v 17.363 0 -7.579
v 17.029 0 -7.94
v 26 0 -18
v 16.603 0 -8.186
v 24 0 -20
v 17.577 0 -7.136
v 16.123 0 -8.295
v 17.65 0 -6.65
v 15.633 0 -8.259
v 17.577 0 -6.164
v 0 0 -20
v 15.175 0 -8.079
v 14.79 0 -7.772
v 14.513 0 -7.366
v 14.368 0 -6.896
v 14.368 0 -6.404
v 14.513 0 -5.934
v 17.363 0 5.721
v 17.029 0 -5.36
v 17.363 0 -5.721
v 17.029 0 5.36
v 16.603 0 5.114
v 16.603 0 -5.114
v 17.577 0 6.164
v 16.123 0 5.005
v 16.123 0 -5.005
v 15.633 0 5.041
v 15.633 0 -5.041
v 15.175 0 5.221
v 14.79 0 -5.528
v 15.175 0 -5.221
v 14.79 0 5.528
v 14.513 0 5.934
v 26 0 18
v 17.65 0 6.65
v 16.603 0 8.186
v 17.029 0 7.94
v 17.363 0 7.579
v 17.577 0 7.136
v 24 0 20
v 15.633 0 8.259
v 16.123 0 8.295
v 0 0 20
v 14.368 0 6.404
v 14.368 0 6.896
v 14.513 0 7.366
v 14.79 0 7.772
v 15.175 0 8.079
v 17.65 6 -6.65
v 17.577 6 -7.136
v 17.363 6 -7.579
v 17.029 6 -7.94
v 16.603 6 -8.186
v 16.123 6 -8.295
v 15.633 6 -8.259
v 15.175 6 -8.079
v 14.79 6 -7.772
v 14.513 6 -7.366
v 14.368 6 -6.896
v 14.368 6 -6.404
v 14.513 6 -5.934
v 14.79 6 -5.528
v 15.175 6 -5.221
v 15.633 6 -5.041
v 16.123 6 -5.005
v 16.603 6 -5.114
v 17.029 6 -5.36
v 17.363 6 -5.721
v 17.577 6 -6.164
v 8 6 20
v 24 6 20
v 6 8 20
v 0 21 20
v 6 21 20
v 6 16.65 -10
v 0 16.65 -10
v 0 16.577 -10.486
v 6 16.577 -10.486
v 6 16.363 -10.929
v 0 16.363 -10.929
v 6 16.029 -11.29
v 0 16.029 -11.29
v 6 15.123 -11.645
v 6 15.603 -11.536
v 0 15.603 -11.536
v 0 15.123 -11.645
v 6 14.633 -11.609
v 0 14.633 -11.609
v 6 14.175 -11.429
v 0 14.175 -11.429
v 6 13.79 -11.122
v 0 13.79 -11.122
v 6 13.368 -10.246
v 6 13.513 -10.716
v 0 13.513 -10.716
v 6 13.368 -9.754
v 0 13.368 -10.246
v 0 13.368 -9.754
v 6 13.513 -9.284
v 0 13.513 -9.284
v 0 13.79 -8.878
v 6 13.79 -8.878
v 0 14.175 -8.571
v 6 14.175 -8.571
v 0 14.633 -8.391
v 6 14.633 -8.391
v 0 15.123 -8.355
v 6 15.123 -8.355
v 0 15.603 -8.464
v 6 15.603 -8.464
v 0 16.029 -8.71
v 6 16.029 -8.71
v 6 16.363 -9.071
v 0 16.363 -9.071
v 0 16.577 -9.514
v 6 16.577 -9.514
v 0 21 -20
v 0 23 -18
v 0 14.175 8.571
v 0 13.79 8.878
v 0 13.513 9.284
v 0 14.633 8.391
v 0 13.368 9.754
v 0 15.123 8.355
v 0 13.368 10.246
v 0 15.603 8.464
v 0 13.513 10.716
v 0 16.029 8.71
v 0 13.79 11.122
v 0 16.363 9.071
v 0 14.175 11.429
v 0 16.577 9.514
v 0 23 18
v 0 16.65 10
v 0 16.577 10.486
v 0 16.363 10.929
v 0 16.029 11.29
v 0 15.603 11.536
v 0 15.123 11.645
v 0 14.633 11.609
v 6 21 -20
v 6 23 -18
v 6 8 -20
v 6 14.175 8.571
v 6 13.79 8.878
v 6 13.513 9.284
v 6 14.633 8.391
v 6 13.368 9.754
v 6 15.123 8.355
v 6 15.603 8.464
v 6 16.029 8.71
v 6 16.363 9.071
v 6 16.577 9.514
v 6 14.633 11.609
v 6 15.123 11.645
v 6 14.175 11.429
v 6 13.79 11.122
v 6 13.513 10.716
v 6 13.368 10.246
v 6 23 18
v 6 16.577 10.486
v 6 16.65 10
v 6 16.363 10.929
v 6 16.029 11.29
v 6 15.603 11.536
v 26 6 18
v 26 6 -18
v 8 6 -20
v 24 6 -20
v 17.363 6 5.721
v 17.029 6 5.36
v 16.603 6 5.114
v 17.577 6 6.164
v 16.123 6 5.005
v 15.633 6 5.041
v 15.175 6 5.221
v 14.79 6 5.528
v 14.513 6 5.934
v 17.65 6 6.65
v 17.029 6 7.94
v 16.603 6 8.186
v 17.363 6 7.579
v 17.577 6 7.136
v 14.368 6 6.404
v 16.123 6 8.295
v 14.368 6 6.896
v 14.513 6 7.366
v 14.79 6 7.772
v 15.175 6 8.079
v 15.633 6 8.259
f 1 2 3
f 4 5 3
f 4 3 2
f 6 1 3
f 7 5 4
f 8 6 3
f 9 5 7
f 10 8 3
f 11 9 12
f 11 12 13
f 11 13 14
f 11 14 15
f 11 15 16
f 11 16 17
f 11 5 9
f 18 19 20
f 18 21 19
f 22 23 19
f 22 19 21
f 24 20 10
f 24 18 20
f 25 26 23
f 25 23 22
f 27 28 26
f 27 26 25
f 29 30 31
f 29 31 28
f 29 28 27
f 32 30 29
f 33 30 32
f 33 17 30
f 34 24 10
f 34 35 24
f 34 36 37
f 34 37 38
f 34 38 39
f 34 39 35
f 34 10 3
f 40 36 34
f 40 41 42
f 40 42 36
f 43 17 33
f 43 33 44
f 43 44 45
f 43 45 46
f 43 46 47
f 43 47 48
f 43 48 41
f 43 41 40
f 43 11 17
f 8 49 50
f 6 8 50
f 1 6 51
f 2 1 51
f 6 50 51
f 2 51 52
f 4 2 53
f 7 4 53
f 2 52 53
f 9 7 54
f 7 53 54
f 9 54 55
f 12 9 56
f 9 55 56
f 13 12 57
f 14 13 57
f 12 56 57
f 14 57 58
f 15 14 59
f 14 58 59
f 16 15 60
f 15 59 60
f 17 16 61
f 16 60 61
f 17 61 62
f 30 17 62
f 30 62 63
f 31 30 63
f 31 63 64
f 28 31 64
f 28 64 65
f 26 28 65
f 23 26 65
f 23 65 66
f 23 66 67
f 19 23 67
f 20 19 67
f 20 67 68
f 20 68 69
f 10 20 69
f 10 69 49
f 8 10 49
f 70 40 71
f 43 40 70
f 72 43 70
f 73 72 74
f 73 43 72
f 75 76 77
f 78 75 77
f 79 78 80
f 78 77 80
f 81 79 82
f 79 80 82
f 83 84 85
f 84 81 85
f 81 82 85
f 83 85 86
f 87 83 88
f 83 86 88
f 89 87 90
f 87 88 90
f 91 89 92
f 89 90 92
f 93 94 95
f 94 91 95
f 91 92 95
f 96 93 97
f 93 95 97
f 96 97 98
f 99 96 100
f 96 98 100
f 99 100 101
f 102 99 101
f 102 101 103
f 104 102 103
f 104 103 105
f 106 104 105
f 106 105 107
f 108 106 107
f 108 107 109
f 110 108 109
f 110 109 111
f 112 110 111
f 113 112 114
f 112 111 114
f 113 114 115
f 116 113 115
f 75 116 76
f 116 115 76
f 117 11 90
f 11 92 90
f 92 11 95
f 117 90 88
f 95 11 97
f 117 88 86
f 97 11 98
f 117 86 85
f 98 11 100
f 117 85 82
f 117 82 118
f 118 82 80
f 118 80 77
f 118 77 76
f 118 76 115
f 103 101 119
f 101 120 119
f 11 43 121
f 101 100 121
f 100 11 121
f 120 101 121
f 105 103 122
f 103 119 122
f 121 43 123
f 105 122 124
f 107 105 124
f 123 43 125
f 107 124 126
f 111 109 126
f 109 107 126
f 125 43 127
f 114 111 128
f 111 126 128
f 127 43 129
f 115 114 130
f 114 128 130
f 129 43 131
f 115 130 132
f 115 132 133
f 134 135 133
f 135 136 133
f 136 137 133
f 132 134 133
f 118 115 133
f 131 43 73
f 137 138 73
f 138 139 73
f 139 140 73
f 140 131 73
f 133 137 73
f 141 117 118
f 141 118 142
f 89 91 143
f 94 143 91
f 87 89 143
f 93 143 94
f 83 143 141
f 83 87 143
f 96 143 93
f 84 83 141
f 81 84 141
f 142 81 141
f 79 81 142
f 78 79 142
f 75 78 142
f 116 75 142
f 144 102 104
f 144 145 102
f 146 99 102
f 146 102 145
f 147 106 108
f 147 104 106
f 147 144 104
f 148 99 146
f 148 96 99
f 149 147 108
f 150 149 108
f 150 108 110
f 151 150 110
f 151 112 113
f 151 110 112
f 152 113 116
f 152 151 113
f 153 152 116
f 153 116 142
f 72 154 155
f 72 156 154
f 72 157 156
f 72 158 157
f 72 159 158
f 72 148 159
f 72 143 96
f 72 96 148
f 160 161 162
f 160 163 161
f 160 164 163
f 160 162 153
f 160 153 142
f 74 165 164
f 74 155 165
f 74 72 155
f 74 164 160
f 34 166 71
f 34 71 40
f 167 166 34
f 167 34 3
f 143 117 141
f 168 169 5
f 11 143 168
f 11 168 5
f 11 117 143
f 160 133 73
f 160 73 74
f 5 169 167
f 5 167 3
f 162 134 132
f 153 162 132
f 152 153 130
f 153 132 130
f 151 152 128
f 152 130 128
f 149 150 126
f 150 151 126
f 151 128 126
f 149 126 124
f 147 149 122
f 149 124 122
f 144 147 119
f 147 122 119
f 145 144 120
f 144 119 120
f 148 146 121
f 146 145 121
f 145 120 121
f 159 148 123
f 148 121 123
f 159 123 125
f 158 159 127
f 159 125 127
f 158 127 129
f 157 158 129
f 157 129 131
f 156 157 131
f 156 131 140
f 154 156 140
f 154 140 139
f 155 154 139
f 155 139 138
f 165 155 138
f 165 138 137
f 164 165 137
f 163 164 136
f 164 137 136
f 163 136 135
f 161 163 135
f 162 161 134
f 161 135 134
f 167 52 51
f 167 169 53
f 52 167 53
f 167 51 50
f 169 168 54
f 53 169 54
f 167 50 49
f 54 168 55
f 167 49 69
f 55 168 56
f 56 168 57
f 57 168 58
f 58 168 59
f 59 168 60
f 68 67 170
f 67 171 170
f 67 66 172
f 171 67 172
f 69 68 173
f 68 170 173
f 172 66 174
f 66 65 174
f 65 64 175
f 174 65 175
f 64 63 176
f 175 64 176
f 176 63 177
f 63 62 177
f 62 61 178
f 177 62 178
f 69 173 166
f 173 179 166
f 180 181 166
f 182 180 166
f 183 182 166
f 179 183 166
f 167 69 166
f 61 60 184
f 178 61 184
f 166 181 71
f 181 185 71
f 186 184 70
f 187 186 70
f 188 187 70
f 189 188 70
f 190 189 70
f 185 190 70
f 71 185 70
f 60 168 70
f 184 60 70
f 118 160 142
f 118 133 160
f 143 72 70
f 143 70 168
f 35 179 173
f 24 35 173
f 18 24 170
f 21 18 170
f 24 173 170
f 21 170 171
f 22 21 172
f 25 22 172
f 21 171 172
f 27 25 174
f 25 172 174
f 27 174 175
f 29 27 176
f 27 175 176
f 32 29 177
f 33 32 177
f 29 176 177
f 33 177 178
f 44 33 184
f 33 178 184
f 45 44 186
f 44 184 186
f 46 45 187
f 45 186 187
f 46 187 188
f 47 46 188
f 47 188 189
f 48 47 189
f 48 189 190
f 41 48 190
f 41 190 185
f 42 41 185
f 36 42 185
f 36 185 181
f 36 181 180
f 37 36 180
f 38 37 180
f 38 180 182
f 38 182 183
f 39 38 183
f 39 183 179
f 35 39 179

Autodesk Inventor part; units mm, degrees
ref_plane "YZ Plane" through (0, 0, 0) normal (1, 0, 0) x (0, 1, 0)
ref_plane "XZ Plane" through (0, 0, 0) normal (0, 1, 0) x (-1, 0, 0)
ref_plane "XY Plane" through (0, 0, 0) normal (0, 0, 1) x (1, 0, 0)
sketch "Sketch1" plane through (0, 0, 0) normal (1, 0, 0) x (0, 1, 0)
  circle A0 centre (15, 10) radius 1.65
  line L0 (0, 0) -> (9.4364, 0)
  circle A1 centre (15, -10) radius 1.65
  line L1 (0, 20) -> (23, 20)
  line L2 (23, 20) -> (23, -20)
  line L3 (23, -20) -> (0, -20)
  line L4 (0, -20) -> (0, 20)
  dimension "d0" = 15
  dimension "d1" = 20
  dimension "d2" = 3.3
  dimension "d3" = 23
  dimension "d4" = 40
extrude "Extrusion1" add sketch "Sketch1" along normal blind 6
sketch "Sketch2" plane through (6, 0, 0) normal (1, 0, 0) x (0, 0, -1)
  line L0 (20, 23) -> (-20, 23) projected
  line L1 (-20, 23) -> (-20, 0) projected
  line L2 (-20, 0) -> (20, 0) projected
  line L3 (20, 0) -> (20, 23) projected
  circle A0 centre (-10, 15) radius 1.65 projected
  circle A1 centre (10, 15) radius 1.65 projected
  line L4 (-20, 0) -> (20, 0)
  line L5 (20, 0) -> (20, 6)
  line L6 (20, 6) -> (-20, 6)
  line L7 (-20, 6) -> (-20, 0)
  point P0 (0, 0)
  dimension "d7" = 6
extrude "Extrusion2" add sketch "Sketch2" along normal blind 20 contours L3 L2 L1 L6
sketch "Sketch3" plane through (6, 6, 20) normal (0, 1, 0) x (1, 0, 0)
  line L0 (0, 0) -> (0, 40) projected
  line L1 (0, 0) -> (20, 0) projected
  line L2 (20, 40) -> (20, 0) projected
  line L3 (0, 40) -> (20, 40) projected
  circle A0 centre (10, 13.35) radius 1.65
  circle A1 centre (10, 26.65) radius 1.65
  line L4 (10, 13.35) -> (10, 26.65) construction
  point P0 (-6, 20)
  point P1 (10, 40)
  point P2 (10, 20)
  point P3 (0, 20)
  dimension "d10" = 3.3
  dimension "d11" = 10
extrude "Extrusion3" cut sketch "Sketch3" against normal through all contours A0 | A1
chamfer "Chamfer1" distance 2 angle 45 5 edges at (3, 23, 20) (3, 23, -20) (26, 3, 20) (26, 3, -20) (6, 6, 0)
properties part number "SOPORTE_TOBOGAN_V2" material "Steel, Mild, Welded"
